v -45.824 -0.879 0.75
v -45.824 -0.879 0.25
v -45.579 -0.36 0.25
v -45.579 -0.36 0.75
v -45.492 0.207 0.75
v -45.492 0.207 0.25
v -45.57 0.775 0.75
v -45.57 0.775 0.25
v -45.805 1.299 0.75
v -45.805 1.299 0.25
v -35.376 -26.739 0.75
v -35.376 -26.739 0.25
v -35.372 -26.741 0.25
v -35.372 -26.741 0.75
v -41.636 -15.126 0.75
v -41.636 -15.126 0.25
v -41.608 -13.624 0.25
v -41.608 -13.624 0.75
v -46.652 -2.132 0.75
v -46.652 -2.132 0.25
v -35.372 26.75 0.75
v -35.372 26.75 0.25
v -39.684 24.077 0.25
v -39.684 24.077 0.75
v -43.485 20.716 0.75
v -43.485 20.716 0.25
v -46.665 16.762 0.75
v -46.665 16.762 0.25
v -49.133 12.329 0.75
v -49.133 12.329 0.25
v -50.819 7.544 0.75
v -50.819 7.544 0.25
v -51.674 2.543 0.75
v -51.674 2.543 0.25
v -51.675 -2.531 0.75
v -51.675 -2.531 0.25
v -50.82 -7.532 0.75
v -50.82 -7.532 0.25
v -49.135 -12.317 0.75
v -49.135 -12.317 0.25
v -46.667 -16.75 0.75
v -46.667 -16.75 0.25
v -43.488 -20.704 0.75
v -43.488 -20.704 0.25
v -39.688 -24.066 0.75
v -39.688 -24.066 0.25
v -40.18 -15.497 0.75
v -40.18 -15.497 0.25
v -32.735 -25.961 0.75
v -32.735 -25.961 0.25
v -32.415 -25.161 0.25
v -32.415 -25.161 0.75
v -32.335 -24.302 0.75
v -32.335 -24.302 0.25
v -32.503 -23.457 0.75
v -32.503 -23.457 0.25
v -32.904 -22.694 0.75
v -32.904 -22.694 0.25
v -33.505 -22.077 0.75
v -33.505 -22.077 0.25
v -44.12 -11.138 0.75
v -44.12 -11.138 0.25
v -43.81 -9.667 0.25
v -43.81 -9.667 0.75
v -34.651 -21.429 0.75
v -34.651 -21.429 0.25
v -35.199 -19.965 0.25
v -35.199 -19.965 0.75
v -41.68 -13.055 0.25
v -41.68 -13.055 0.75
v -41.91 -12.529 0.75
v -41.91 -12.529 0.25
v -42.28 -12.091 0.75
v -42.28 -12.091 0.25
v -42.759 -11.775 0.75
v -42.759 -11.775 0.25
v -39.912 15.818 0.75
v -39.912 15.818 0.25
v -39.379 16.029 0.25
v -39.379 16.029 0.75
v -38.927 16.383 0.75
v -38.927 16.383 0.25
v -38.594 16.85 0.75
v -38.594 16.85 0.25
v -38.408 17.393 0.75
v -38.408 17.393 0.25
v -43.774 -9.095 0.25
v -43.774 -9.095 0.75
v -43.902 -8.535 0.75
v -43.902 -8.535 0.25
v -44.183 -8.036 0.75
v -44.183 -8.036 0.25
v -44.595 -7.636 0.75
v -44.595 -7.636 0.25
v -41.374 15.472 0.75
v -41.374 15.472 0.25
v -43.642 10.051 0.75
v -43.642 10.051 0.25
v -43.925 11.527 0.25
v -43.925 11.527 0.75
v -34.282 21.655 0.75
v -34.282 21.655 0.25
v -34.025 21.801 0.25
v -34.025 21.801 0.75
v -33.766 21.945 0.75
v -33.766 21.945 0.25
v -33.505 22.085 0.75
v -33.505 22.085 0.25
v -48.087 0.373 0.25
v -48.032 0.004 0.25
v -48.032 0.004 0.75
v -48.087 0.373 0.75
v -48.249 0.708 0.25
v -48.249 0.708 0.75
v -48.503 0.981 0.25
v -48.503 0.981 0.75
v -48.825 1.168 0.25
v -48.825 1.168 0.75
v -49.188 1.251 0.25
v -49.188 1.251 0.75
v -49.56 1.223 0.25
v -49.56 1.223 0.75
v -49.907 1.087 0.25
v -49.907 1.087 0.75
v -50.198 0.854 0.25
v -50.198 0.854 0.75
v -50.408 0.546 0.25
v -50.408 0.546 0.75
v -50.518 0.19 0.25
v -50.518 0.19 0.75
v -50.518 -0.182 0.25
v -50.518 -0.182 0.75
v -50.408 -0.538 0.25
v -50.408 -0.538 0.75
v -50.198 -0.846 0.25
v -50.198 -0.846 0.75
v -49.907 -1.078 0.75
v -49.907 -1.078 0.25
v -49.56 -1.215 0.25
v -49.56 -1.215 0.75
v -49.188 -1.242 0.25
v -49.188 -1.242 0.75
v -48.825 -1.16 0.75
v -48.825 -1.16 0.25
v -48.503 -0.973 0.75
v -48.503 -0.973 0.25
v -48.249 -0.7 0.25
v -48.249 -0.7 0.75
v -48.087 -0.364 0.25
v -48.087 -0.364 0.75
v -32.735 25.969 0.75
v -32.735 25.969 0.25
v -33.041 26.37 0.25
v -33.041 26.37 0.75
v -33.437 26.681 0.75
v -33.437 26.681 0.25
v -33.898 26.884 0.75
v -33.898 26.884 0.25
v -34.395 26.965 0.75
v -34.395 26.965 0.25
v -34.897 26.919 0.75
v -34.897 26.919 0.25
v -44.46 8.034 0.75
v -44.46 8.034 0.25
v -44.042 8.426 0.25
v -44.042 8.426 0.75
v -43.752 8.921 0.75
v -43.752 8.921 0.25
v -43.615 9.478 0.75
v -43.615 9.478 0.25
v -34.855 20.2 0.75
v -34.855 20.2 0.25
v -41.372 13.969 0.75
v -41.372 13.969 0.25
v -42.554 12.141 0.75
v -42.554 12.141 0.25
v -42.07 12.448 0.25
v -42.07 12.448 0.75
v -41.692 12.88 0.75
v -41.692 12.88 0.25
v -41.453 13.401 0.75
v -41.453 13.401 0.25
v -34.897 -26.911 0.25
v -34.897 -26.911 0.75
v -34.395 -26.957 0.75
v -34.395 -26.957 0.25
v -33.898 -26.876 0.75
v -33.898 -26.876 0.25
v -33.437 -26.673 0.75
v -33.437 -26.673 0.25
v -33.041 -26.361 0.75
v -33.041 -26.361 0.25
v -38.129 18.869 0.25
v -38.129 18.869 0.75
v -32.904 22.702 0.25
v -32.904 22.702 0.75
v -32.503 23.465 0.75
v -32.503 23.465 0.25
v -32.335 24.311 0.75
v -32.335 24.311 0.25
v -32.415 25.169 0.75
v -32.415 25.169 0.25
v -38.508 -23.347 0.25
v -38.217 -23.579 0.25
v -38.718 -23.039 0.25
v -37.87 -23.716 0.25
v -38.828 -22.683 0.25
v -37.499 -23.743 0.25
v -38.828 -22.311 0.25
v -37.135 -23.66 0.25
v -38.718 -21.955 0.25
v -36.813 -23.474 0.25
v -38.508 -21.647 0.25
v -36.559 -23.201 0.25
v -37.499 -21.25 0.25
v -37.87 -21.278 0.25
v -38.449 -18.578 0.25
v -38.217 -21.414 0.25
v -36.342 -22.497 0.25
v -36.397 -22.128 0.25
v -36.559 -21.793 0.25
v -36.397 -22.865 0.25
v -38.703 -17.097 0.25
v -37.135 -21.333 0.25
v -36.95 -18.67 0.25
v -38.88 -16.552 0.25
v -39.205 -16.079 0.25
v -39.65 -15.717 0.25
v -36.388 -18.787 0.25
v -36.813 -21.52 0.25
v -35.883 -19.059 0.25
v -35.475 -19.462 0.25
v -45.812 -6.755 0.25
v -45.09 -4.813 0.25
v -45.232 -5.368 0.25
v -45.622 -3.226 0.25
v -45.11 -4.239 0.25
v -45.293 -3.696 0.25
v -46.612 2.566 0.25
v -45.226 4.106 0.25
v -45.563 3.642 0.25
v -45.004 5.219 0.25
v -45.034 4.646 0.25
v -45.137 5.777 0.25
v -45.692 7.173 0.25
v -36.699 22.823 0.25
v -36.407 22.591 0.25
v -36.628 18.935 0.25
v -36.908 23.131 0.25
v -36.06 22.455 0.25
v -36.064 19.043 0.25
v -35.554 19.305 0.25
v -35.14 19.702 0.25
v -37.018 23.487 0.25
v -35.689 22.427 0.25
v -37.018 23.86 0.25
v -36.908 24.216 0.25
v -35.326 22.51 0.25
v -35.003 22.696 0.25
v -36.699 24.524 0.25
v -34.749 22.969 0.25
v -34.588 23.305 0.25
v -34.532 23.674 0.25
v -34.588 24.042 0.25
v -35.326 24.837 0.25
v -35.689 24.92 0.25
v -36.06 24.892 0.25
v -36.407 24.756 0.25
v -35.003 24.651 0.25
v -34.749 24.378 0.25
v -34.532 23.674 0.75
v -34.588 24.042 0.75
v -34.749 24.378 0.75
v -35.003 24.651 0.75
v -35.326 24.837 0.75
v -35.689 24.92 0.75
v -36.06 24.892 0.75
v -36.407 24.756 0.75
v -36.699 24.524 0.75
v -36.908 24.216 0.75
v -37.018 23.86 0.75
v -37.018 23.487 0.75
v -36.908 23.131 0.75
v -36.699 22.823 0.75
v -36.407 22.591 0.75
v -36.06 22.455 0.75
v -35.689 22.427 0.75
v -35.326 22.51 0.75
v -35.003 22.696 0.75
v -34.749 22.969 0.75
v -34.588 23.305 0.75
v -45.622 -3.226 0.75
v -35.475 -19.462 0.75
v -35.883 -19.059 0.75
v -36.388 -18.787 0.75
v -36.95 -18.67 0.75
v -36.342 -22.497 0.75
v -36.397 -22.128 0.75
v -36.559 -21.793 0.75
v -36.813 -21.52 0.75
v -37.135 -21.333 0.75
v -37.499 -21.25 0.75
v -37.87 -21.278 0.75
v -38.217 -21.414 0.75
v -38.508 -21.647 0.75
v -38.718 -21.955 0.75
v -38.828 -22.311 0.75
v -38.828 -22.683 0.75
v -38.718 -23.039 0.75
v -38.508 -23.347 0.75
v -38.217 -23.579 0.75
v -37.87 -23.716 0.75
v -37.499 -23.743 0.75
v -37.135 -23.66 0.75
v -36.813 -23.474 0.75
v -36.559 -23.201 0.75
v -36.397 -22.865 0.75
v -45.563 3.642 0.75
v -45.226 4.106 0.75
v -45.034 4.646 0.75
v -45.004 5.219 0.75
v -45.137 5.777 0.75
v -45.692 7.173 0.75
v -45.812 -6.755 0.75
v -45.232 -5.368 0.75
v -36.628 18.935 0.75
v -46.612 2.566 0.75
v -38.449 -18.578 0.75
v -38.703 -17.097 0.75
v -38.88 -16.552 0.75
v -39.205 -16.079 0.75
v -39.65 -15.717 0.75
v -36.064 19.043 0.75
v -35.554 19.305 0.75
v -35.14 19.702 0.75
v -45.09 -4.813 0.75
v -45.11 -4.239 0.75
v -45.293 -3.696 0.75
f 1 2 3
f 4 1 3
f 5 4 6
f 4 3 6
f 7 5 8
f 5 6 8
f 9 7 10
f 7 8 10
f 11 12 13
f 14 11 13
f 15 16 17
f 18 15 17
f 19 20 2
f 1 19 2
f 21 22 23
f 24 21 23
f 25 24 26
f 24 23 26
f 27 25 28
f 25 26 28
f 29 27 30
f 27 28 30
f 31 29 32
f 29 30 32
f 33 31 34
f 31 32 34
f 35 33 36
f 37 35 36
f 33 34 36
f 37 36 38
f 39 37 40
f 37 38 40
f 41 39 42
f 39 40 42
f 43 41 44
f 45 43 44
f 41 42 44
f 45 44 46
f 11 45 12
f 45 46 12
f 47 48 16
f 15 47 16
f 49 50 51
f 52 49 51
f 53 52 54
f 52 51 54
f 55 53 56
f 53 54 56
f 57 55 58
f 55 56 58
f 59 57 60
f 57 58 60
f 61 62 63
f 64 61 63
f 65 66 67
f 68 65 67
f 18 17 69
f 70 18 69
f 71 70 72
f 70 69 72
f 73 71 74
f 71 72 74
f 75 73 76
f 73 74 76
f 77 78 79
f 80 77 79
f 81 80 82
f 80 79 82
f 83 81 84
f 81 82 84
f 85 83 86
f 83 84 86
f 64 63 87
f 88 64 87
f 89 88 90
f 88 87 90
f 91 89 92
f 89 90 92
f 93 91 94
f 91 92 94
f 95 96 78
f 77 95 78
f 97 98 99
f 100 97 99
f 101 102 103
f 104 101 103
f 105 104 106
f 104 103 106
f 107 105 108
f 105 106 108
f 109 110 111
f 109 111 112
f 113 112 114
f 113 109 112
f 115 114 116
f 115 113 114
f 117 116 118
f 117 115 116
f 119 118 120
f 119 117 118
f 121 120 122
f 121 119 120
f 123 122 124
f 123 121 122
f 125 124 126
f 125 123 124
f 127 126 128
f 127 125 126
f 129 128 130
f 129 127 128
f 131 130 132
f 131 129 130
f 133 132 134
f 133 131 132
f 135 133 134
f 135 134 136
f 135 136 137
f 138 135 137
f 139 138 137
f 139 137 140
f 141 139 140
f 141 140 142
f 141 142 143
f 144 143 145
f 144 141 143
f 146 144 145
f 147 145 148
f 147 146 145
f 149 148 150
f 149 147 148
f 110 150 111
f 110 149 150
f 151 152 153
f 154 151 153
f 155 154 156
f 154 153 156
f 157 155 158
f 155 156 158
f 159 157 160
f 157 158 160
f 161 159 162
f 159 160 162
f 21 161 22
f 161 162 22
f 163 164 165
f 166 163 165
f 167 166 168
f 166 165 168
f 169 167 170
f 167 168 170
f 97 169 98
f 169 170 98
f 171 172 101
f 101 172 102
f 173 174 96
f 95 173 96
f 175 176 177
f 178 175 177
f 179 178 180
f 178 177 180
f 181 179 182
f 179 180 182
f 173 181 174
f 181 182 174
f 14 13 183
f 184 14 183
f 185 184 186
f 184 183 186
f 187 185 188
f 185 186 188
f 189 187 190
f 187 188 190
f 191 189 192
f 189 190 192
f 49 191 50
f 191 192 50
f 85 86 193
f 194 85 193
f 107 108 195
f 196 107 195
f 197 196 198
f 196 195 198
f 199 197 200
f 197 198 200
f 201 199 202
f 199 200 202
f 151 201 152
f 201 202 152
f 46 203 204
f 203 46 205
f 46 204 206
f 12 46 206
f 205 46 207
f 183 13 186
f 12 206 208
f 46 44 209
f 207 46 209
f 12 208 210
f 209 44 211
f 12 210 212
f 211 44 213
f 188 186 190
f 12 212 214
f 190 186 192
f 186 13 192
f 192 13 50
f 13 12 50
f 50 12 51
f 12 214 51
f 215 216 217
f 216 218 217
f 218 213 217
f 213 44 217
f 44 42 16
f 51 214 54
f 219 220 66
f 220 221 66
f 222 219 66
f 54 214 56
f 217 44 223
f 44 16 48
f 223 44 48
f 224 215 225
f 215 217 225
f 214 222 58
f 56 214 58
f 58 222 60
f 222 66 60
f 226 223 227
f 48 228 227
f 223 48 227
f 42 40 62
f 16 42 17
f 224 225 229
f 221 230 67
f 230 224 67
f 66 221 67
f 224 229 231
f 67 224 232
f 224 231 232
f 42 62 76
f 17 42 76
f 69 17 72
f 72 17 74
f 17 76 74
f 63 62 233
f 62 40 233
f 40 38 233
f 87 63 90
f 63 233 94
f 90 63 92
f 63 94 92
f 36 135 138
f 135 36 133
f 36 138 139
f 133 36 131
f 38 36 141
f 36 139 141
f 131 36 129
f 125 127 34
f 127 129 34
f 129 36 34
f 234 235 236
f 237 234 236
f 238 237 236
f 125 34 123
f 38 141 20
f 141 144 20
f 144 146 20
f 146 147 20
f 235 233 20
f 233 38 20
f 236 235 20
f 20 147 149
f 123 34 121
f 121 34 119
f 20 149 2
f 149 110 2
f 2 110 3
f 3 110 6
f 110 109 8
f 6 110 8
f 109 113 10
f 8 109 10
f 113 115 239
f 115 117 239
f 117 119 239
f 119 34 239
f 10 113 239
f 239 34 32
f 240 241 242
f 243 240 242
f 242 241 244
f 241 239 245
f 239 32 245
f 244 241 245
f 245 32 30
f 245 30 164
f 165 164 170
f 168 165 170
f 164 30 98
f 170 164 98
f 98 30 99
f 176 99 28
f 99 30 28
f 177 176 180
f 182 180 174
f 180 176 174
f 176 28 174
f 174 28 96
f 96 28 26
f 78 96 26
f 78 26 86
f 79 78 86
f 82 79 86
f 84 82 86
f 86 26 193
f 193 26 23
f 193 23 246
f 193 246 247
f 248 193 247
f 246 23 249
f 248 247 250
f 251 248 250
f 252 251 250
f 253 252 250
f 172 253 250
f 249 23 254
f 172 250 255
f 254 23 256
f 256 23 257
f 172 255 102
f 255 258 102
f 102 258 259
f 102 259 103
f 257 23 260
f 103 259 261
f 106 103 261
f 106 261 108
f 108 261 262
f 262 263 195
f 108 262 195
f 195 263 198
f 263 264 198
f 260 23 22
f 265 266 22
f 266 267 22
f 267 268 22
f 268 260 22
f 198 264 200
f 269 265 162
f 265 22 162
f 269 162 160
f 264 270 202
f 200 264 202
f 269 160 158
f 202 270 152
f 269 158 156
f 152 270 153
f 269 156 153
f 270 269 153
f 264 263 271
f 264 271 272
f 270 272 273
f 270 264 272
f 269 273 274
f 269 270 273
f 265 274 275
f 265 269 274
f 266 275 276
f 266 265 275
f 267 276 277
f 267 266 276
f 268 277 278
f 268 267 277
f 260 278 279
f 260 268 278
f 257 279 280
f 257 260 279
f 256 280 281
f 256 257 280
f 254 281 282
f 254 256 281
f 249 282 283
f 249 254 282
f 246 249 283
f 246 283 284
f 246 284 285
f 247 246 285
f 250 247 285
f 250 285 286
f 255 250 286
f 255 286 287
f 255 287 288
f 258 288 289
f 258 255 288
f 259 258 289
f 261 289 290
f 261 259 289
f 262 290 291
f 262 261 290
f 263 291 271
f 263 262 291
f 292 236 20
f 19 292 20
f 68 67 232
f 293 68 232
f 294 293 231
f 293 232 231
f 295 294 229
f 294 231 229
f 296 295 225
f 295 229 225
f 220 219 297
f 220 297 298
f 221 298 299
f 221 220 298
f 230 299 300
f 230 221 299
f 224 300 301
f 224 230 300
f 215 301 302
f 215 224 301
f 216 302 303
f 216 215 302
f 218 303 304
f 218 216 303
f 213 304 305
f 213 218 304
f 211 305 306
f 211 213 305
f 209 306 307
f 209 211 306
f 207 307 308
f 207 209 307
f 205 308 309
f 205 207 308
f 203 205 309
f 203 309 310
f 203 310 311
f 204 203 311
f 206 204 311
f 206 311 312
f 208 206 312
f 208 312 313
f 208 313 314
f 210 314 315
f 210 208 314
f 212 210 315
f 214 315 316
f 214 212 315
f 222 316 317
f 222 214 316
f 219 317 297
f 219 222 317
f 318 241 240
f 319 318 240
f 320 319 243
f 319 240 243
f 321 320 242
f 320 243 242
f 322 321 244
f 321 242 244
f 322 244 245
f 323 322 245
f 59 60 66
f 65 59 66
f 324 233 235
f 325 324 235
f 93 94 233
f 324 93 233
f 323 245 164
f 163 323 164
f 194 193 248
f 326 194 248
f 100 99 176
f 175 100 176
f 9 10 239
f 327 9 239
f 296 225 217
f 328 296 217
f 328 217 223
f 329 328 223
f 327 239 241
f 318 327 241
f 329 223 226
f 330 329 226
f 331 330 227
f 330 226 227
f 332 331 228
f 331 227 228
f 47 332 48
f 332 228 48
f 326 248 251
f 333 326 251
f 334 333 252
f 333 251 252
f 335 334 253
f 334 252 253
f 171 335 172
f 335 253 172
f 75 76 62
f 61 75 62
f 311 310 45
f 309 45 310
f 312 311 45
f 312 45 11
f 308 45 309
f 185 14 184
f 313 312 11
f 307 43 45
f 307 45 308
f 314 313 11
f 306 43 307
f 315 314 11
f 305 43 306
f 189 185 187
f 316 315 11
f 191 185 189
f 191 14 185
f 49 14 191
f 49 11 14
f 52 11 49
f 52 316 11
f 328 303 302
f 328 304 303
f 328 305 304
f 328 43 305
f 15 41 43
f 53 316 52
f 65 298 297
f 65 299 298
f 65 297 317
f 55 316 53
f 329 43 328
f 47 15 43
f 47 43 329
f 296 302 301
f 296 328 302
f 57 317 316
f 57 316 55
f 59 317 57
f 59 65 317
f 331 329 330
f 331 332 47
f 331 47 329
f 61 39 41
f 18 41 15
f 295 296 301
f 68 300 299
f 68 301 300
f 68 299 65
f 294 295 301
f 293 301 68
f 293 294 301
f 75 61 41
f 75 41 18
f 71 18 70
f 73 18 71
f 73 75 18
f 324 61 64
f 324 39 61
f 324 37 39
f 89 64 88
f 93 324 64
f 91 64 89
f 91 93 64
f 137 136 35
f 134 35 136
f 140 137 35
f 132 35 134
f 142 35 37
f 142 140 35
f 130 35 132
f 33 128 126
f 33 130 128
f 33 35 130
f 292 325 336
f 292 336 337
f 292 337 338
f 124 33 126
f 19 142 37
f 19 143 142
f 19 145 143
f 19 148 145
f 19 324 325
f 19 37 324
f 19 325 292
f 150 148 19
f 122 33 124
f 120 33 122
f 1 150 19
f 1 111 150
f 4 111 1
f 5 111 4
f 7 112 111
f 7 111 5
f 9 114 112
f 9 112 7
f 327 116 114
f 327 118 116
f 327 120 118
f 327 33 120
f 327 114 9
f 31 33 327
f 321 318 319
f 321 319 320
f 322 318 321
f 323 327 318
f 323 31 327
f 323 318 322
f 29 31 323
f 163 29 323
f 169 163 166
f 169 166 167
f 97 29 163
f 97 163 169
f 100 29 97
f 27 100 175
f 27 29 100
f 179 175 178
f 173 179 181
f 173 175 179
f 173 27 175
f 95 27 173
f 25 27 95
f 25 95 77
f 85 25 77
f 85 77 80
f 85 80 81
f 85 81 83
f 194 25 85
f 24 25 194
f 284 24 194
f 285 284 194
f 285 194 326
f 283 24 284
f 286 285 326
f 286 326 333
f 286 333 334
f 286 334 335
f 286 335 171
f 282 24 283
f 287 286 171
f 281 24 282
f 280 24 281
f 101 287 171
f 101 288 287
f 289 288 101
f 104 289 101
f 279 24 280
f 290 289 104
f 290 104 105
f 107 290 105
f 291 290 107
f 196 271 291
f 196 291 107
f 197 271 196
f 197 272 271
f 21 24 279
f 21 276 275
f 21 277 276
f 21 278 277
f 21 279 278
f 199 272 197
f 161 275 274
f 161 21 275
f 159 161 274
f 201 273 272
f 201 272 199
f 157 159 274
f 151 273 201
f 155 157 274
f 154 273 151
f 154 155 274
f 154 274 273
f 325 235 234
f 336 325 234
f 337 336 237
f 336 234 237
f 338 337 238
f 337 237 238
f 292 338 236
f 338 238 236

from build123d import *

# Parameters (mm, degrees)
IZIM1_R                     = 2.5
Y_KSEKLIK_EKSTR_ZYON1_DEPTH = 1
SCALE1_SCALE                = 0.5


with BuildPart() as part:
    # Çizim1 → Yükseklik-Ekstrüzyon1 (new body)
    with BuildSketch(Plane.XY):
        with BuildLine():
            Line((-23.446136356, -44.161959762), (-25.73775467, -42.866863479))
            Line((-25.73775467, -42.866863479), (-26.834295942, -39.938466016))
            ThreePointArc((-26.834295942, -39.938466016), (-28.201527977, -38.125336415), (-30.335428898, -37.348658075))
            Line((-30.335428898, -37.348658075), (-33.334907776, -37.164700371))
            Line((-33.334907776, -37.164700371), (-33.842709051, -34.202800331))
            ThreePointArc((-33.842709051, -34.202800331), (-34.84597704, -32.165592505), (-36.7965457, -31.002818113))
            Line((-36.7965457, -31.002818113), (-39.708425324, -30.260072511))
            Line((-39.708425324, -30.260072511), (-39.652227319, -27.255483394))
            ThreePointArc((-39.652227319, -27.255483394), (-40.255989993, -25.066366444), (-41.954126526, -23.558687864))
            Line((-41.954126526, -23.558687864), (-44.675252109, -22.283466496))
            Line((-44.675252109, -22.283466496), (-44.057045667, -19.342627369))
            ThreePointArc((-44.057045667, -19.342627369), (-44.239914432, -17.079151855), (-45.625461503, -15.279979352))
            Line((-45.625461503, -15.279979352), (-48.059435816, -13.517457571))
            Line((-48.059435816, -13.517457571), (-46.901121207, -10.744549126))
            ThreePointArc((-46.901121207, -10.744549126), (-46.656617846, -8.486899797), (-47.680491761, -6.459969953))
            Line((-47.680491761, -6.459969953), (-49.741090048, -4.272585973))
            Line((-49.741090048, -4.272585973), (-48.083701146, -1.765839874))
            ThreePointArc((-48.083701146, -1.765839874), (-47.420487313, 0.406004917), (-48.046416828, 2.588887101))
            Line((-48.046416828, 2.588887101), (-49.660641368, 5.123644113))
            Line((-49.660641368, 5.123644113), (-47.562892001, 7.275425136))
            ThreePointArc((-47.562892001, 7.275425136), (-46.504462376, 9.284526705), (-46.710273625, 11.546031539))
            Line((-46.710273625, 11.546031539), (-47.82093971, 14.338366552))
            Line((-47.82093971, 14.338366552), (-45.357143694, 16.058954583))
            ThreePointArc((-45.357143694, 16.058954583), (-43.940993675, 17.834139505), (-43.719395692, 20.094152054))
            Line((-43.719395692, 20.094152054), (-44.287157421, 23.045145208))
            Line((-44.287157421, 23.045145208), (-41.54459596, 24.273587558))
            ThreePointArc((-41.54459596, 24.273587558), (-39.820893366, 25.751969023), (-39.17973637, 27.930427214))
            Line((-39.17973637, 27.930427214), (-39.184480502, 30.935538106))
            Line((-39.184480502, 30.935538106), (-36.260310201, 31.628316593))
            ThreePointArc((-36.260310201, 31.628316593), (-34.290118058, 32.757522199), (-33.252115355, 34.777253066))
            Line((-33.252115355, 34.777253066), (-32.693673826, 37.730024144))
            Line((-32.693673826, 37.730024144), (-29.691484877, 37.862596744))
            ThreePointArc((-29.691484877, 37.862596744), (-27.544598222, 38.602623821), (-26.146521576, 40.39207739))
            Line((-26.146521576, 40.39207739), (-25, 43.301270189))
            ThreePointArc((-25, 43.301270189), (-24.226890609, 43.73851588), (-23.446136356, 44.161959762))
            ThreePointArc((-23.446136356, 44.161959762), (-21.212806241, 47.755648425), (-21.906244367, 51.929556087))
            ThreePointArc((-21.906244367, 51.929556087), (-24.232021318, 53.76021953), (-27.179564099, 53.490852446))
            ThreePointArc((-27.179564099, 53.490852446), (-59.999999835, 0.004450967), (-27.1875, -53.486819346))
            Line((-27.1875, -53.486819346), (-27.179564099, -53.490852446))
            ThreePointArc((-27.179564099, -53.490852446), (-24.232021318, -53.76021953), (-21.906244367, -51.929556087))
            ThreePointArc((-21.906244367, -51.929556087), (-21.212806241, -47.755648425), (-23.446136356, -44.161959762))
        make_face()
        with Locations((-31.620079453, -45.001895242)):
            Circle(IZIM1_R, mode=Mode.SUBTRACT)
        with Locations((-55, 0)):
            Circle(IZIM1_R, mode=Mode.SUBTRACT)
        with Locations((-28.000624989, 47.338831842)):
            Circle(IZIM1_R, mode=Mode.SUBTRACT)
    extrude(amount=Y_KSEKLIK_EKSTR_ZYON1_DEPTH)


with BuildPart() as part_1:
    # Scale1: scaled about (-43.563815172, 0.008171627, 0.5)
    add(part.part.scale(SCALE1_SCALE).moved(Location((-21.781907586, 0.004085814, 0.25))))


solid = part_1.part
